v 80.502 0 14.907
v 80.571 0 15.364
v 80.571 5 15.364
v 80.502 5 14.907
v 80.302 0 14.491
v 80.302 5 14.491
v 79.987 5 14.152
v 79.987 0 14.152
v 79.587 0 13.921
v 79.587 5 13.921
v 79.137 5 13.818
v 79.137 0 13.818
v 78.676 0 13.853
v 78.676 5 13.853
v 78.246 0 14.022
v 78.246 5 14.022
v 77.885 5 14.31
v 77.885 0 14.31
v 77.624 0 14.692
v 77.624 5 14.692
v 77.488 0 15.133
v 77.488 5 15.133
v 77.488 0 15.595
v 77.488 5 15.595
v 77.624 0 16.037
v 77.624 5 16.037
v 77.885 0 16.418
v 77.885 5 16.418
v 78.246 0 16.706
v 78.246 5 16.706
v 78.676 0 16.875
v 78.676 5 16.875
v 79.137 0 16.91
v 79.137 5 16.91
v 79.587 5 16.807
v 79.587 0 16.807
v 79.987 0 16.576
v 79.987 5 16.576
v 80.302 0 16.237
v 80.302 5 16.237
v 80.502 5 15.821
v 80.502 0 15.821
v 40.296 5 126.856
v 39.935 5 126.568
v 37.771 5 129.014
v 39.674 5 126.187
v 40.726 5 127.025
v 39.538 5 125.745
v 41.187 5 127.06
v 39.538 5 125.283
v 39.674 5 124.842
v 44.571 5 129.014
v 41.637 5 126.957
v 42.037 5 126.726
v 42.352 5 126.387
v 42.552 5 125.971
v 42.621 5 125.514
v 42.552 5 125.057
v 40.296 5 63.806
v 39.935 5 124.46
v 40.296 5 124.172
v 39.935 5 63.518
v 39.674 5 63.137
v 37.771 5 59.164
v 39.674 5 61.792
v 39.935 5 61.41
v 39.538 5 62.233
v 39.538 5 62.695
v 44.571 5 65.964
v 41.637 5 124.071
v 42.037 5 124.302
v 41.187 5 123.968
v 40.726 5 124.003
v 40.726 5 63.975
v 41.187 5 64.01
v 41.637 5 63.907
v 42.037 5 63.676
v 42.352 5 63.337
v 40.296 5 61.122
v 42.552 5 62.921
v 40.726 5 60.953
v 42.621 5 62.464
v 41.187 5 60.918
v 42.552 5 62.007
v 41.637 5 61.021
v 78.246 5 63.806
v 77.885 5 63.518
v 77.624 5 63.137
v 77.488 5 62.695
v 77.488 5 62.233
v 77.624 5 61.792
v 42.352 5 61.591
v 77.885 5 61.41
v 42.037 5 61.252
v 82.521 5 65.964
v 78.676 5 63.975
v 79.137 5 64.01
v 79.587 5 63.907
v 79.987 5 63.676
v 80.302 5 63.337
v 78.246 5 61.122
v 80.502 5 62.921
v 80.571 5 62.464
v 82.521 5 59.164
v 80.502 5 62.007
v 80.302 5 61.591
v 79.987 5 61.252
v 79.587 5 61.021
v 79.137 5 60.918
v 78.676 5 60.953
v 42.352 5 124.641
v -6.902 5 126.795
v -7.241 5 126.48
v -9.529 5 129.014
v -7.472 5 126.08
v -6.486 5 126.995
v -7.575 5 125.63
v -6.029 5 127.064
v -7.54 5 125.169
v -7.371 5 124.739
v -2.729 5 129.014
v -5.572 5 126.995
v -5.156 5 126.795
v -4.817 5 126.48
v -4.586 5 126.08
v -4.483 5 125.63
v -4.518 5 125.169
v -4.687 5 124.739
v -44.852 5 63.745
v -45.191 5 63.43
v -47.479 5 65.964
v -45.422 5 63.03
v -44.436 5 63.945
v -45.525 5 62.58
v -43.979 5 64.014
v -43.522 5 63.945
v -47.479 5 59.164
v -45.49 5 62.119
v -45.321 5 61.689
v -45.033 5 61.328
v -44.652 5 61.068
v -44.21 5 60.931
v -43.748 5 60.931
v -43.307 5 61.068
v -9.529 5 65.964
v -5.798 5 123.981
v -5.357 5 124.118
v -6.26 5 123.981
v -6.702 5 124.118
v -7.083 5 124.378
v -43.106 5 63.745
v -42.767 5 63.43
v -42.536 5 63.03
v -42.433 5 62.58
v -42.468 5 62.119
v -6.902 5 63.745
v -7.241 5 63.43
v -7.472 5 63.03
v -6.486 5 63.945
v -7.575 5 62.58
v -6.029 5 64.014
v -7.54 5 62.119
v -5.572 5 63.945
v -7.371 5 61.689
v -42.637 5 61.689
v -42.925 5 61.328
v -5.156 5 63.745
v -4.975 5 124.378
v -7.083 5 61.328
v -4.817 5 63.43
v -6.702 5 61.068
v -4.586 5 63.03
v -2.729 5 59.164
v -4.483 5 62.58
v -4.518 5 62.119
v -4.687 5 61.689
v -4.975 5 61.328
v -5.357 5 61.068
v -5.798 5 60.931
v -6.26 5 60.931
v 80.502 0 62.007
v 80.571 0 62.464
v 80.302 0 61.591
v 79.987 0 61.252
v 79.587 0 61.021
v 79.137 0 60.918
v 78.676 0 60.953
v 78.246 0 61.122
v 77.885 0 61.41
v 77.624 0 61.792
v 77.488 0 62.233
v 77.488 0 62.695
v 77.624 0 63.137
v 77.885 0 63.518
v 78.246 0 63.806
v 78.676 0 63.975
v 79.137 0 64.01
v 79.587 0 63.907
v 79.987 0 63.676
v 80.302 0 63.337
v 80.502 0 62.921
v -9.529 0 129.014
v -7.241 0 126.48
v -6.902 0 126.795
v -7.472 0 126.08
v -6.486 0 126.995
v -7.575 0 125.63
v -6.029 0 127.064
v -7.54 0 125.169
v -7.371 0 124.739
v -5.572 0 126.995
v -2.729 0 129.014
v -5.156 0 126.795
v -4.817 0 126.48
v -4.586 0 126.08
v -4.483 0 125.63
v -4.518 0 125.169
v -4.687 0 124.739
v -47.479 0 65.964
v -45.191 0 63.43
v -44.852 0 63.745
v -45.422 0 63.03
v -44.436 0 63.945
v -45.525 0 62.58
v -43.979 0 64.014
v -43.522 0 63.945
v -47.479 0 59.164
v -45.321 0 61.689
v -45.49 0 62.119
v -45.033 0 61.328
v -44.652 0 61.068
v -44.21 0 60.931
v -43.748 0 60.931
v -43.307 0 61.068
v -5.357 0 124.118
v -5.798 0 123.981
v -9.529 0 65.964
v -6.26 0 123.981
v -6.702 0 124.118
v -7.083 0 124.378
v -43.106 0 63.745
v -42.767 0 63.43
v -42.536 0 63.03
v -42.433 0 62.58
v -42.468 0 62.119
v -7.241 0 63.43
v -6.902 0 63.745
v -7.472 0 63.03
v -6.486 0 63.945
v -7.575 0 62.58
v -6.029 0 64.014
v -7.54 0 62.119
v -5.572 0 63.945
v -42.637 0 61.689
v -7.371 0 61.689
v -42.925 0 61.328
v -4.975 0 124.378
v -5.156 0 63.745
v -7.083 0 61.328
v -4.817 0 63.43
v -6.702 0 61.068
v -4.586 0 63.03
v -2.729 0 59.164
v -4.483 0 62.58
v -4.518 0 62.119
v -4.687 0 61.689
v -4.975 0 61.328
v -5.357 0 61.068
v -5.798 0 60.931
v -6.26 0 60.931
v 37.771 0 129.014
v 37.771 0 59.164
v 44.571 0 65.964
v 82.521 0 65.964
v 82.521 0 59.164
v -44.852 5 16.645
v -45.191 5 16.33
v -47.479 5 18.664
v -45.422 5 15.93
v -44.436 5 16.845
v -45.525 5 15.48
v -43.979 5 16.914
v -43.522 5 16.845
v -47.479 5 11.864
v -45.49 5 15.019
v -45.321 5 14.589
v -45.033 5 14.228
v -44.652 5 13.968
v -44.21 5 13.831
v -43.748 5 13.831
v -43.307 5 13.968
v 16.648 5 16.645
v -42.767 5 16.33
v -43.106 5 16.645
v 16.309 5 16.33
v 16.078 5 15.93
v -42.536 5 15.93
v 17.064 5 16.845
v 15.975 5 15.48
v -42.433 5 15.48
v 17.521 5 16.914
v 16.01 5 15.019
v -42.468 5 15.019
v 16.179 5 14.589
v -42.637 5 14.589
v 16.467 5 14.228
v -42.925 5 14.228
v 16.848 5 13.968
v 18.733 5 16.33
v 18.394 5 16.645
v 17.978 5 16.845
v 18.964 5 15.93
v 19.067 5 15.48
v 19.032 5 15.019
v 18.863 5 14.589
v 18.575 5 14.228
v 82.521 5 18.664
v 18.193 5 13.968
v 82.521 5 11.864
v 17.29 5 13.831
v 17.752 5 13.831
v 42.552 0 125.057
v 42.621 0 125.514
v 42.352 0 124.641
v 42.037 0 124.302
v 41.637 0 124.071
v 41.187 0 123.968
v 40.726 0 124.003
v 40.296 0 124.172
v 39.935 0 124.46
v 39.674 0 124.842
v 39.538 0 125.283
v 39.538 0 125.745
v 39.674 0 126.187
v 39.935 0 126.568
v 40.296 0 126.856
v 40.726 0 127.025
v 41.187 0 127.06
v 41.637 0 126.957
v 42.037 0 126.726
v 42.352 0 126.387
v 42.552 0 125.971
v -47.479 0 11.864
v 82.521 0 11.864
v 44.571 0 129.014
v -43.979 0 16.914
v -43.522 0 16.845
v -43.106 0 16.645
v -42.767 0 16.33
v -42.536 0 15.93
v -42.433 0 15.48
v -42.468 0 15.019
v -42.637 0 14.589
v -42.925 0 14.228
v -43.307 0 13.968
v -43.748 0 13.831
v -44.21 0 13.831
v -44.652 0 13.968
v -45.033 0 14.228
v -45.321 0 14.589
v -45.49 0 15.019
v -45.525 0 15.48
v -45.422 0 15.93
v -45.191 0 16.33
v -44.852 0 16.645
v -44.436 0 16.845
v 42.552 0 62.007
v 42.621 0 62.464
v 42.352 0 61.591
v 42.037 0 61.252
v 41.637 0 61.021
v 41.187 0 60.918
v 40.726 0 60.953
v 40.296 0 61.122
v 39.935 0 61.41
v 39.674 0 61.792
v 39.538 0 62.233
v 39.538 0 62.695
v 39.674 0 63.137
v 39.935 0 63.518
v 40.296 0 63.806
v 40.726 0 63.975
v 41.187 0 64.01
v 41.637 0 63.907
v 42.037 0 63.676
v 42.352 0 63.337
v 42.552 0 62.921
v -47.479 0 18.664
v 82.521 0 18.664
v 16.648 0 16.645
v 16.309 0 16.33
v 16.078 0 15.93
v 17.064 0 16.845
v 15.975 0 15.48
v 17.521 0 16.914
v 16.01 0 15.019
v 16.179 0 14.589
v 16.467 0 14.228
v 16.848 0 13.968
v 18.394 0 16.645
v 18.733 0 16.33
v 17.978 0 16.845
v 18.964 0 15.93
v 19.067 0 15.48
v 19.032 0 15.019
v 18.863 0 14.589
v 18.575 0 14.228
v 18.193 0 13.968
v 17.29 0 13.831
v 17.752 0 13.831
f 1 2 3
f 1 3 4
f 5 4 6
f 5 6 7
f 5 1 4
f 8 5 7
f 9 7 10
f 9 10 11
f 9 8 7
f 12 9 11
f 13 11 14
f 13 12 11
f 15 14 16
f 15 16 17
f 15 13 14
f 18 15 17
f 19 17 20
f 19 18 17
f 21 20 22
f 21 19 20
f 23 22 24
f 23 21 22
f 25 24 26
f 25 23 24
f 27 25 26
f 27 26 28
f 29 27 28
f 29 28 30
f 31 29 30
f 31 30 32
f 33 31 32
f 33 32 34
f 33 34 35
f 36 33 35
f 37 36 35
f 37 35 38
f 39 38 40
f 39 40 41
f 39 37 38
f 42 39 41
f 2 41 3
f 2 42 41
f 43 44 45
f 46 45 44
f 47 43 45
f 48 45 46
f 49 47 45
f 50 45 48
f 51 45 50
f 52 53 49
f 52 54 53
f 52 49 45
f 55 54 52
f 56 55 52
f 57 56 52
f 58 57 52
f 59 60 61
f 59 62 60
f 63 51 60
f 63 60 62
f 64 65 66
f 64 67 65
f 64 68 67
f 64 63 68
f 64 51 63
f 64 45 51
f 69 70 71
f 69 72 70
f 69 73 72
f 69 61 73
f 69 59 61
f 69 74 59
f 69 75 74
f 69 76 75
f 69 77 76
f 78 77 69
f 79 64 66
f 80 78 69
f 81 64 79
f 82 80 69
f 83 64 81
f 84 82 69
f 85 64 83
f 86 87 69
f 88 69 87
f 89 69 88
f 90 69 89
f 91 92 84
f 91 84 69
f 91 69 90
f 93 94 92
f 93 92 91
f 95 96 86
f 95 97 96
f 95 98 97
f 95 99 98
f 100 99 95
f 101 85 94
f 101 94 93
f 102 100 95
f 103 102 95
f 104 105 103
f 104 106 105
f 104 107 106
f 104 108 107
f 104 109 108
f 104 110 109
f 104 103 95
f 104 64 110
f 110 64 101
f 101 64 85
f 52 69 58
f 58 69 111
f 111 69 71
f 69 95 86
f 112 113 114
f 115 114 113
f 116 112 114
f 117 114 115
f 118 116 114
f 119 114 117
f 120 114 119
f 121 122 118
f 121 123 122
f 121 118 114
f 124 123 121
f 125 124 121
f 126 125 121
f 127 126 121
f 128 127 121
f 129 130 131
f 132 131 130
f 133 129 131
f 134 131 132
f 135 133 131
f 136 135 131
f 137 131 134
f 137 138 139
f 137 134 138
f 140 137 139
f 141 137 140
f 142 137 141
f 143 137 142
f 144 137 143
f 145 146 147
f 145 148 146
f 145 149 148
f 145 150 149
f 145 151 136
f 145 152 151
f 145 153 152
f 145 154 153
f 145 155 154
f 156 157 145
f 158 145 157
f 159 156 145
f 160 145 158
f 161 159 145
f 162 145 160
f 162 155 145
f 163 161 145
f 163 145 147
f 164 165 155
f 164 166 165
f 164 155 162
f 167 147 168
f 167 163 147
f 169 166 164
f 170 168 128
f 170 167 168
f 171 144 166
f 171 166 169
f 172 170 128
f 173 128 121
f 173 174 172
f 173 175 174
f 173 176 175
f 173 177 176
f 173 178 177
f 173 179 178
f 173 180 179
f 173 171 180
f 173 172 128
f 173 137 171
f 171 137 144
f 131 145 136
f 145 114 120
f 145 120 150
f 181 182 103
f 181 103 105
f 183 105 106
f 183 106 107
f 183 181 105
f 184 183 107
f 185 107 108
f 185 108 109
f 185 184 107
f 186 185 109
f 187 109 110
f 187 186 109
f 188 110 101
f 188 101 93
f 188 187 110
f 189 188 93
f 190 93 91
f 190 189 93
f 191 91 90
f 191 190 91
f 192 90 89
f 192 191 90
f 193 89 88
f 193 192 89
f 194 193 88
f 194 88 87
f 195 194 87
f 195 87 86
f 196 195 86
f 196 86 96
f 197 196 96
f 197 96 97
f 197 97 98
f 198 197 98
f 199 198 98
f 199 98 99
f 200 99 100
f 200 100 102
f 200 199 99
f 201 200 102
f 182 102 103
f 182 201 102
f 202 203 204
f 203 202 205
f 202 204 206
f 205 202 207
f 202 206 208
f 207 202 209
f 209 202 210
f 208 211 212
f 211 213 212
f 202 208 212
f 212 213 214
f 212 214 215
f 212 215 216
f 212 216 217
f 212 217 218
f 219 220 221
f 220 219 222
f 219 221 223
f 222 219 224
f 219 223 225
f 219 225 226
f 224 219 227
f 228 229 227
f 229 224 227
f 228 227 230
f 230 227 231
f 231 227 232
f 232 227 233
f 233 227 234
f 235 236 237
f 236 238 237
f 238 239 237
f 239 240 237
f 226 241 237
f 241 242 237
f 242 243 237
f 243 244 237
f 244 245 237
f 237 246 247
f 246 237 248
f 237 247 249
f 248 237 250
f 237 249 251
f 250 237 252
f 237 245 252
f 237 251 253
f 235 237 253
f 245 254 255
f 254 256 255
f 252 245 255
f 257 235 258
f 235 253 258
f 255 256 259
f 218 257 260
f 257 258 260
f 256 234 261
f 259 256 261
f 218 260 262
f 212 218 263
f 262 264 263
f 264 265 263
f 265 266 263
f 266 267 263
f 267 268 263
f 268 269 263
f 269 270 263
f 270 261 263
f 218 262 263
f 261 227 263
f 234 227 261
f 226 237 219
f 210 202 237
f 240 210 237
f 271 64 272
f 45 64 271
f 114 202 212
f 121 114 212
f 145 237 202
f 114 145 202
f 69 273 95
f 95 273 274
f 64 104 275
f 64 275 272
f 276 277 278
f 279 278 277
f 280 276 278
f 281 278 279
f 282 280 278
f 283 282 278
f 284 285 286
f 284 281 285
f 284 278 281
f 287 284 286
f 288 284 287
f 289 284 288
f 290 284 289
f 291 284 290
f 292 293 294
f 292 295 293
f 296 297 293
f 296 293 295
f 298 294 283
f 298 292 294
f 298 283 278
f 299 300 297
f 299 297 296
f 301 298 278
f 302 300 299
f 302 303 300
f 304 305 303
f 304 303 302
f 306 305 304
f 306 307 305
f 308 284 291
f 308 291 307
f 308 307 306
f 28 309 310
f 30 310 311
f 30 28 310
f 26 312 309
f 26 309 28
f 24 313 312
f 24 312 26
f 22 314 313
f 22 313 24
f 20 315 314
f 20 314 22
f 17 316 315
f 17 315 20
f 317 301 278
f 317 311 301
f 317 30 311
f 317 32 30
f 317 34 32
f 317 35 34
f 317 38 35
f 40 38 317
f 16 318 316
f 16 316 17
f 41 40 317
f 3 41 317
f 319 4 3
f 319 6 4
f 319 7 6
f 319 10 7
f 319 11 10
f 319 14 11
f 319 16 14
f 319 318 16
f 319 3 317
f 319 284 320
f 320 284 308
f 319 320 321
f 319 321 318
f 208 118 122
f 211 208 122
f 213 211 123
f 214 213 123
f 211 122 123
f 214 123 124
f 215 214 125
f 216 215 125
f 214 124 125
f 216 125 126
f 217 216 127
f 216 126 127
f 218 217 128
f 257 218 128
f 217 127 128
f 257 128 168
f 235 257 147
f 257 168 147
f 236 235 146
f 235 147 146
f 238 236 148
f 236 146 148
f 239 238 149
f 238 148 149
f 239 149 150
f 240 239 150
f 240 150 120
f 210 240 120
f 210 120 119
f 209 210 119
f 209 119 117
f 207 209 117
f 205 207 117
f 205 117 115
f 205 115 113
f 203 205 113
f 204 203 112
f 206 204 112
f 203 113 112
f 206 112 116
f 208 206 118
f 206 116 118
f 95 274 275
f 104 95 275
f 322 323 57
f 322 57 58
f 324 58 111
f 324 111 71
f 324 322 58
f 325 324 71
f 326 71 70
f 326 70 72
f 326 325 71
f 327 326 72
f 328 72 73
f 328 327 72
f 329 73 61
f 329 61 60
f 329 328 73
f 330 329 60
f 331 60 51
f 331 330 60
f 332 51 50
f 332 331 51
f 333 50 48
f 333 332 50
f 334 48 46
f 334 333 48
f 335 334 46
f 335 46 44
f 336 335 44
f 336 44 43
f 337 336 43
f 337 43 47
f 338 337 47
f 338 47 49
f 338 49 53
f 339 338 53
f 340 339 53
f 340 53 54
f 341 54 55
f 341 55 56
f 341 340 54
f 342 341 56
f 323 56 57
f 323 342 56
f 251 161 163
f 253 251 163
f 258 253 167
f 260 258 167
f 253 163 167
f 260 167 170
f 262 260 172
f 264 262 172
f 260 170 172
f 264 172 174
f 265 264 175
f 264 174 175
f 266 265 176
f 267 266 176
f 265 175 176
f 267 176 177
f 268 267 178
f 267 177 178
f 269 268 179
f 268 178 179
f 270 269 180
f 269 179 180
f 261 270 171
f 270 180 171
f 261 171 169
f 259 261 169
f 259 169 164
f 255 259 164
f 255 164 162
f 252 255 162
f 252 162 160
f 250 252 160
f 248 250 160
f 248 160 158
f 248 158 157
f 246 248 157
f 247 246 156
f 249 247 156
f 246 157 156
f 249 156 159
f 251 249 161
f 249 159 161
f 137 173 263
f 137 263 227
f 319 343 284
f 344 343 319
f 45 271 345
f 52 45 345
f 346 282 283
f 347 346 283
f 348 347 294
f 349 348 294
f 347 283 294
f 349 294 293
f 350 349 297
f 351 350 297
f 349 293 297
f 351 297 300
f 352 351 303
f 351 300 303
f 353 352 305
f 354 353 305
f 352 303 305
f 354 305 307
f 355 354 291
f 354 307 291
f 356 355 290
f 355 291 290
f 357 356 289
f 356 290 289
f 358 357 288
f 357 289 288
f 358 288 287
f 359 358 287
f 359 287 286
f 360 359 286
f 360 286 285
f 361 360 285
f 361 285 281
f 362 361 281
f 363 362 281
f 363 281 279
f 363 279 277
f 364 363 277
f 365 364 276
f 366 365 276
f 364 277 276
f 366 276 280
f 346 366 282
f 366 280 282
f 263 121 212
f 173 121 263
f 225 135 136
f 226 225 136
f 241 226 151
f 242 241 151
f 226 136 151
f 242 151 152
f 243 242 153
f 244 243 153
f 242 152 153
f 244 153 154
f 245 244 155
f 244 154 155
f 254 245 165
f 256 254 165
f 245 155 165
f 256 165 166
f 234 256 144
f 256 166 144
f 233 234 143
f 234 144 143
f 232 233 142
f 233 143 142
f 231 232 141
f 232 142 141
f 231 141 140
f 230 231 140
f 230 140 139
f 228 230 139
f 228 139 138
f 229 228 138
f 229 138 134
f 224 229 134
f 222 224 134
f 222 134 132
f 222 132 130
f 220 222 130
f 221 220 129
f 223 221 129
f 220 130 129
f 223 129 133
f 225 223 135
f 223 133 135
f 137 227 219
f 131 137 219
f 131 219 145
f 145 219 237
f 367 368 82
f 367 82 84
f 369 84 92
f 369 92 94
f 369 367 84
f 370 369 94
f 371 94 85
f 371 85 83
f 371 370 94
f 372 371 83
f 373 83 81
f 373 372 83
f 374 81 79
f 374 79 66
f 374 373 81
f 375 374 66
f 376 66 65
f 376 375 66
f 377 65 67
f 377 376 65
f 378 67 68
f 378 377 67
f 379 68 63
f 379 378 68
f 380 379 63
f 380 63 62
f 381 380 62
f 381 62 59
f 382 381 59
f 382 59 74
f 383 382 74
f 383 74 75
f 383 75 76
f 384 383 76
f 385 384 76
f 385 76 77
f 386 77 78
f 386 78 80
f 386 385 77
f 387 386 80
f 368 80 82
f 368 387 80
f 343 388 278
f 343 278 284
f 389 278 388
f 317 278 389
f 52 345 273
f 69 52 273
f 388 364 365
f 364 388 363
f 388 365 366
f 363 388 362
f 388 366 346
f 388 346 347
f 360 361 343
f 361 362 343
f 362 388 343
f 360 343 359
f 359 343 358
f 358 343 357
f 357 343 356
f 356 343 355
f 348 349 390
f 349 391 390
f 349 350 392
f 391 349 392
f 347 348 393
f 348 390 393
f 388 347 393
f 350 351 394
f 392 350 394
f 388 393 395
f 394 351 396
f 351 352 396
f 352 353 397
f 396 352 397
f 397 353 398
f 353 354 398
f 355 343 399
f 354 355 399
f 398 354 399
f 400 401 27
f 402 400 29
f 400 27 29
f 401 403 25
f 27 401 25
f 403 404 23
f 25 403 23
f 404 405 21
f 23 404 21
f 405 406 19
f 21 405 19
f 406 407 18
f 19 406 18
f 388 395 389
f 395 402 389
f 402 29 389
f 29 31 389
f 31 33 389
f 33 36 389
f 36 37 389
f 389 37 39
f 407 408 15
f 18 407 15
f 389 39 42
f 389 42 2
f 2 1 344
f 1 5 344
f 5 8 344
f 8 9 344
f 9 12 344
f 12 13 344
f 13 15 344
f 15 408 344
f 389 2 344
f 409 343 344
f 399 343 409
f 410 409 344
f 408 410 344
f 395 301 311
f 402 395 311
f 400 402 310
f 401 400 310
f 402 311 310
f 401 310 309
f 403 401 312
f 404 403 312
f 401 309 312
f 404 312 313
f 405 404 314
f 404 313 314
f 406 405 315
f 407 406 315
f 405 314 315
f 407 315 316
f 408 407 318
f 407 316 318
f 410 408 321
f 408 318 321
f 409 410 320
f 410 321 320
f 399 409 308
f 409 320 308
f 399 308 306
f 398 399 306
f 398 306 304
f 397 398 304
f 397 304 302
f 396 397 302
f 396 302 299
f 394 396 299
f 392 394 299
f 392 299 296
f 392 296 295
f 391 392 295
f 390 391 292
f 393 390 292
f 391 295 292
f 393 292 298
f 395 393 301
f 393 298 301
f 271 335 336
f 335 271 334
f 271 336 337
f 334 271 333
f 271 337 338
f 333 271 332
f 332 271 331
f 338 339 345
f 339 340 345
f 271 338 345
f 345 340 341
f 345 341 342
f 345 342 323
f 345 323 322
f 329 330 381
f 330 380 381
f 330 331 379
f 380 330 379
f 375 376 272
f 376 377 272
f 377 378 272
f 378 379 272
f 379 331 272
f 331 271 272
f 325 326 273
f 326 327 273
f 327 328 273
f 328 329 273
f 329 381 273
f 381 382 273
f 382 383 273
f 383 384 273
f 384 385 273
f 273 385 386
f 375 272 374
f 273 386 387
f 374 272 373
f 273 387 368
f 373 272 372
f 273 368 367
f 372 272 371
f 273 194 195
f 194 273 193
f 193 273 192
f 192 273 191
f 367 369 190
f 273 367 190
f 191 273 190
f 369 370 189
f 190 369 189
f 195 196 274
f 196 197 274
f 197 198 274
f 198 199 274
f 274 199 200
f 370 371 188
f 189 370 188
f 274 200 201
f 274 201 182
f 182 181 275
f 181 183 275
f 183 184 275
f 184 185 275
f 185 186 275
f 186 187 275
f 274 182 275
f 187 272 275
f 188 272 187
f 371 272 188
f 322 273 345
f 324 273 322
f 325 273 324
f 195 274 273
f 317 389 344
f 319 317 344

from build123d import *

# Parameters (mm, degrees)
BOSS_EXTRUDE1_DEPTH   = 5
SKETCH4_W             = 130
SKETCH4_H             = 7
BOSS_EXTRUDE1_2_DEPTH = 5
BOSS_EXTRUDE1_3_DEPTH = 5
SKETCH5_R             = 1.55
CUT_EXTRUDE1_DEPTH    = 5
MIRROR1_OUTLINE_R     = 1.55
MIRROR1_DEPTH         = 5
SKETCH6_R             = 1.55
CUT_EXTRUDE2_DEPTH    = 5
SKETCH7_W             = 130
SKETCH7_H             = 5
CUT_EXTRUDE3_DEPTH    = 0.2
SKETCH8_W             = 70.05
SKETCH8_H             = 5
CUT_EXTRUDE4_DEPTH    = 0.2
SKETCH9_W             = 44.75
SKETCH9_H             = 5
CUT_EXTRUDE5_DEPTH    = 0.2
SKETCH10_W            = 70.05
SKETCH10_H            = 5
CUT_EXTRUDE6_DEPTH    = 0.2
SKETCH11_W            = 44.75
SKETCH11_H            = 5
CUT_EXTRUDE7_DEPTH    = 0.2


# Read off the part's stored shape, not the designer's step: Mirror1
with BuildPart() as part:
    # Sketch4 → Boss-Extrude1 (new body)
    with BuildSketch(Plane(origin=(0, 0, 0), x_dir=(1, 0, 0), z_dir=(0, 1, 0))):
        Polygon((-47.47915883, -58.964084508), (-47.47915883, -65.964084508), (-9.52915883, -65.964084508), (-9.52915883, -129.014084508), (-2.52915883, -129.014084508), (-2.52915883, -58.964084508), align=None)
    extrude(amount=BOSS_EXTRUDE1_DEPTH)


with BuildPart() as body_2:
    # Sketch4 → Boss-Extrude1 2 (new body)
    with BuildSketch(Plane(origin=(0, 0, 0), x_dir=(1, 0, 0), z_dir=(0, 1, 0))):
        with Locations((17.52084117, -15.364084508)):
            Rectangle(SKETCH4_W, SKETCH4_H)
    extrude(amount=BOSS_EXTRUDE1_2_DEPTH)


with BuildPart() as body_3:
    # Sketch4 → Boss-Extrude1 3 (new body)
    with BuildSketch(Plane(origin=(0, 0, 0), x_dir=(1, 0, 0), z_dir=(0, 1, 0))):
        Polygon((37.57084117, -58.964084508), (37.57084117, -129.014084508), (44.57084117, -129.014084508), (44.57084117, -65.964084508), (82.52084117, -65.964084508), (82.52084117, -58.964084508), align=None)
    extrude(amount=BOSS_EXTRUDE1_3_DEPTH)


with BuildPart() as cut_extrude1_tool:
    # Sketch5 → Cut-Extrude1 (new body)
    with BuildSketch(Plane(origin=(0, 5, 0), x_dir=(1, 0, 0), z_dir=(0, 1, 0))):
        with Locations(Location((-6.02915883, -125.514084508, 0), (0, 0, 270))):
            Circle(SKETCH5_R)
        with Locations(Location((-6.02915883, -62.464084508, 0), (0, 0, 270))):
            Circle(SKETCH5_R)
        with Locations(Location((-43.97915883, -62.464084508, 0), (0, 0, 270))):
            Circle(SKETCH5_R)
        with Locations(Location((-43.97915883, -15.364084508, 0), (0, 0, 270))):
            Circle(SKETCH5_R)
    extrude(amount=-CUT_EXTRUDE1_DEPTH)


with BuildPart() as part_1:
    add(part.part)

    # Cut-Extrude1: cut by cut_extrude1_tool
    add(cut_extrude1_tool.part, mode=Mode.SUBTRACT)

    # Sketch8 → Cut-Extrude4 (cut)
    with BuildSketch(Plane(origin=(-2.52915883, 0, 0), x_dir=(0, 0, -1), z_dir=(1, 0, 0))):
        with Locations((-93.989084508, 2.5)):
            Rectangle(SKETCH8_W, SKETCH8_H)
    extrude(amount=-CUT_EXTRUDE4_DEPTH, mode=Mode.SUBTRACT)

    # Sketch9 → Cut-Extrude5 (cut)
    with BuildSketch(Plane(origin=(0, 0, 58.964084508), x_dir=(-1, 0, 0), z_dir=(0, 0, -1))):
        with Locations((25.10415883, 2.5)):
            Rectangle(SKETCH9_W, SKETCH9_H)
    extrude(amount=-CUT_EXTRUDE5_DEPTH, mode=Mode.SUBTRACT)


with BuildPart() as body_2_1:
    add(body_2.part)

    # Cut-Extrude1: cut by cut_extrude1_tool
    add(cut_extrude1_tool.part, mode=Mode.SUBTRACT)


with BuildPart() as mirror1_tool:
    # Mirror1 outline → Mirror1 (new body)
    with BuildSketch(Plane(origin=(0, 0, 0), x_dir=(1, 0, 0), z_dir=(0, 1, 0))):
        with Locations((41.07084117, -125.514084508)):
            Circle(MIRROR1_OUTLINE_R)
        with Locations((79.02084117, -62.464084508)):
            Circle(MIRROR1_OUTLINE_R)
        with Locations((41.07084117, -62.464084508)):
            Circle(MIRROR1_OUTLINE_R)
        with Locations((79.02084117, -15.364084508)):
            Circle(MIRROR1_OUTLINE_R)
    extrude(amount=MIRROR1_DEPTH)


with BuildPart() as body_2_2:
    add(body_2_1.part)

    # Mirror1: cut by mirror1_tool
    add(mirror1_tool.part, mode=Mode.SUBTRACT)

    # Sketch6 → Cut-Extrude2 (cut)
    with BuildSketch(Plane(origin=(0, 5, 0), x_dir=(1, 0, 0), z_dir=(0, 1, 0))):
        with Locations(Location((17.52084117, -15.364084508, 0), (0, 0, 270))):
            Circle(SKETCH6_R)
    extrude(amount=-CUT_EXTRUDE2_DEPTH, mode=Mode.SUBTRACT)

    # Sketch7 → Cut-Extrude3 (cut)
    with BuildSketch(Plane.XY.offset(18.864084508)):
        with Locations((17.52084117, 2.5)):
            Rectangle(SKETCH7_W, SKETCH7_H)
    extrude(amount=-CUT_EXTRUDE3_DEPTH, mode=Mode.SUBTRACT)


with BuildPart() as body_3_1:
    add(body_3.part)

    # Mirror1: cut by mirror1_tool
    add(mirror1_tool.part, mode=Mode.SUBTRACT)

    # Sketch10 → Cut-Extrude6 (cut)
    with BuildSketch(Plane.ZY.offset(-37.57084117)):
        with Locations((93.989084508, 2.5)):
            Rectangle(SKETCH10_W, SKETCH10_H)
    extrude(amount=-CUT_EXTRUDE6_DEPTH, mode=Mode.SUBTRACT)

    # Sketch11 → Cut-Extrude7 (cut)
    with BuildSketch(Plane(origin=(0, 0, 58.964084508), x_dir=(-1, 0, 0), z_dir=(0, 0, -1))):
        with Locations((-60.14584117, 2.5)):
            Rectangle(SKETCH11_W, SKETCH11_H)
    extrude(amount=-CUT_EXTRUDE7_DEPTH, mode=Mode.SUBTRACT)


solid = Compound([part_1.part, body_2_2.part, body_3_1.part])
